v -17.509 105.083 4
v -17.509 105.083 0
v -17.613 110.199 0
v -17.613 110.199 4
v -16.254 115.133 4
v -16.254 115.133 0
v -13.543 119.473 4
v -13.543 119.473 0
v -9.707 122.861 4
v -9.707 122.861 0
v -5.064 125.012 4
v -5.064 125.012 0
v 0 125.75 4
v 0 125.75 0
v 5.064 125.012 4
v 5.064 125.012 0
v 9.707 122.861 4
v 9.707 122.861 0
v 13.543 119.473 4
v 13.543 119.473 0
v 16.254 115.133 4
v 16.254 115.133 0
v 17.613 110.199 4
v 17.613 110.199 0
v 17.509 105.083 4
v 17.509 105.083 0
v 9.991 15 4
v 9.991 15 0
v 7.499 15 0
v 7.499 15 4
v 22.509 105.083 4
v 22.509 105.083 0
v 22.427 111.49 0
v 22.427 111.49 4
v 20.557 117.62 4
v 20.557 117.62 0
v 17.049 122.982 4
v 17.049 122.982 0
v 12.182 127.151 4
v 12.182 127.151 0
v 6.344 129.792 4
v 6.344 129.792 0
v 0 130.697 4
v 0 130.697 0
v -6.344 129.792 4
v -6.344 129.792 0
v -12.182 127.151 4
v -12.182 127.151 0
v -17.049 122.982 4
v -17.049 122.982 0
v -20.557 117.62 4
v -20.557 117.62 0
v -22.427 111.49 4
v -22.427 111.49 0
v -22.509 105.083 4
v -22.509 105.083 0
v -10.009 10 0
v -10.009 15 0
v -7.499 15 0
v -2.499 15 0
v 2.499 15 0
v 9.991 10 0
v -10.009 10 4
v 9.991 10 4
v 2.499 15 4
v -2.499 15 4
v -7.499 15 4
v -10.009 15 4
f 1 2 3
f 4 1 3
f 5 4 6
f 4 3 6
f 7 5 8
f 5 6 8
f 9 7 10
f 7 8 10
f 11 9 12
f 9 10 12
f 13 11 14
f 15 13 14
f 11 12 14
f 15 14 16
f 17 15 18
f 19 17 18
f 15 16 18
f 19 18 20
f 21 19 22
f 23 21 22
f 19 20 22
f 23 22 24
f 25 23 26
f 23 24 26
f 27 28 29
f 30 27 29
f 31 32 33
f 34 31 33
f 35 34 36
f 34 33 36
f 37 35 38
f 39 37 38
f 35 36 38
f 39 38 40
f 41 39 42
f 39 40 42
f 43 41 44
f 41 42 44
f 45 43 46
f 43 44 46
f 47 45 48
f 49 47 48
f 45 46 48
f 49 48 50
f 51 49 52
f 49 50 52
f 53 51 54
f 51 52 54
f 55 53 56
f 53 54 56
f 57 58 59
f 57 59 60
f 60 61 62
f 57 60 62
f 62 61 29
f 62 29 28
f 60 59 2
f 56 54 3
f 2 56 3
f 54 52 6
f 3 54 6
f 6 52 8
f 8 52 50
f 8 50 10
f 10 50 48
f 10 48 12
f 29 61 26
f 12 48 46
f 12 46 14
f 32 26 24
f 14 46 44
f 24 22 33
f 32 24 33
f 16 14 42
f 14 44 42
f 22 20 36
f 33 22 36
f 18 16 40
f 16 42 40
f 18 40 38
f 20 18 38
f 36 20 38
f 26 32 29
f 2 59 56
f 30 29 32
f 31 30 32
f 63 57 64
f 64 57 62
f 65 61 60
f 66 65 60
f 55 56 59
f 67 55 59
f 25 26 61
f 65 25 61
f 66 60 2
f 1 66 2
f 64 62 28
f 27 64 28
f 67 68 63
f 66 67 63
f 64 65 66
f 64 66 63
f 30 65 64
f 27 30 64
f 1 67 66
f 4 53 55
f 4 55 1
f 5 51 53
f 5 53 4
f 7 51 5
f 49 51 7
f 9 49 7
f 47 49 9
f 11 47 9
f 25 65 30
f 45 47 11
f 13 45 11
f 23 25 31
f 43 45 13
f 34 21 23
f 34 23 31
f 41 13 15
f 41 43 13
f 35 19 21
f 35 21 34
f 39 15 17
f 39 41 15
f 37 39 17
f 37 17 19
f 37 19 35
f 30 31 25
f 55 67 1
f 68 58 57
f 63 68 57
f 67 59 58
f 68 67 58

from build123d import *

# Parameters (mm, degrees)
F1_DEPTH = 4


# Not quite as in the source:
# - ends of sketch curves that miss each other by under 0.0002 mm in the source are joined


with BuildPart() as f1:
    # F0 (on Top) → F1 (new body)
    with BuildSketch(Plane.XY):
        with BuildLine():
            Line((-2.4992633137, 15), (-17.5086315699, 105.0827546296))
            ThreePointArc((-17.5086315699, 105.0827546296), (0, 125.75), (17.5086315699, 105.0827546296))
            Line((17.5086315699, 105.0827546296), (2.4992633137, 15))
            Line((2.4992633137, 15), (7.4992633137, 14.9999997765))
            Line((7.4992633137, 14.9999997765), (22.5086315699, 105.0827546296))
            ThreePointArc((22.5086315699, 105.0827546296), (0, 130.6968900006), (-22.5086315699, 105.0827546296))
            Line((-22.5086315699, 105.0827546296), (-7.4992633137, 15))
            Line((-7.4992633137, 15), (-2.4992633137, 15))
        make_face()
        Polygon((2.4992633137, 14.9999997765), (-2.4992633137, 14.9999997765), (-7.4992633137, 14.9999997765), (-10.0086377934, 14.9999997765), (-10.0086377934, 9.9999997765), (9.9913622066, 9.9999997765), (9.9913622066, 14.9999997765), (7.4992633137, 14.9999997765), align=None)
    extrude(amount=F1_DEPTH)


solid = f1.part
